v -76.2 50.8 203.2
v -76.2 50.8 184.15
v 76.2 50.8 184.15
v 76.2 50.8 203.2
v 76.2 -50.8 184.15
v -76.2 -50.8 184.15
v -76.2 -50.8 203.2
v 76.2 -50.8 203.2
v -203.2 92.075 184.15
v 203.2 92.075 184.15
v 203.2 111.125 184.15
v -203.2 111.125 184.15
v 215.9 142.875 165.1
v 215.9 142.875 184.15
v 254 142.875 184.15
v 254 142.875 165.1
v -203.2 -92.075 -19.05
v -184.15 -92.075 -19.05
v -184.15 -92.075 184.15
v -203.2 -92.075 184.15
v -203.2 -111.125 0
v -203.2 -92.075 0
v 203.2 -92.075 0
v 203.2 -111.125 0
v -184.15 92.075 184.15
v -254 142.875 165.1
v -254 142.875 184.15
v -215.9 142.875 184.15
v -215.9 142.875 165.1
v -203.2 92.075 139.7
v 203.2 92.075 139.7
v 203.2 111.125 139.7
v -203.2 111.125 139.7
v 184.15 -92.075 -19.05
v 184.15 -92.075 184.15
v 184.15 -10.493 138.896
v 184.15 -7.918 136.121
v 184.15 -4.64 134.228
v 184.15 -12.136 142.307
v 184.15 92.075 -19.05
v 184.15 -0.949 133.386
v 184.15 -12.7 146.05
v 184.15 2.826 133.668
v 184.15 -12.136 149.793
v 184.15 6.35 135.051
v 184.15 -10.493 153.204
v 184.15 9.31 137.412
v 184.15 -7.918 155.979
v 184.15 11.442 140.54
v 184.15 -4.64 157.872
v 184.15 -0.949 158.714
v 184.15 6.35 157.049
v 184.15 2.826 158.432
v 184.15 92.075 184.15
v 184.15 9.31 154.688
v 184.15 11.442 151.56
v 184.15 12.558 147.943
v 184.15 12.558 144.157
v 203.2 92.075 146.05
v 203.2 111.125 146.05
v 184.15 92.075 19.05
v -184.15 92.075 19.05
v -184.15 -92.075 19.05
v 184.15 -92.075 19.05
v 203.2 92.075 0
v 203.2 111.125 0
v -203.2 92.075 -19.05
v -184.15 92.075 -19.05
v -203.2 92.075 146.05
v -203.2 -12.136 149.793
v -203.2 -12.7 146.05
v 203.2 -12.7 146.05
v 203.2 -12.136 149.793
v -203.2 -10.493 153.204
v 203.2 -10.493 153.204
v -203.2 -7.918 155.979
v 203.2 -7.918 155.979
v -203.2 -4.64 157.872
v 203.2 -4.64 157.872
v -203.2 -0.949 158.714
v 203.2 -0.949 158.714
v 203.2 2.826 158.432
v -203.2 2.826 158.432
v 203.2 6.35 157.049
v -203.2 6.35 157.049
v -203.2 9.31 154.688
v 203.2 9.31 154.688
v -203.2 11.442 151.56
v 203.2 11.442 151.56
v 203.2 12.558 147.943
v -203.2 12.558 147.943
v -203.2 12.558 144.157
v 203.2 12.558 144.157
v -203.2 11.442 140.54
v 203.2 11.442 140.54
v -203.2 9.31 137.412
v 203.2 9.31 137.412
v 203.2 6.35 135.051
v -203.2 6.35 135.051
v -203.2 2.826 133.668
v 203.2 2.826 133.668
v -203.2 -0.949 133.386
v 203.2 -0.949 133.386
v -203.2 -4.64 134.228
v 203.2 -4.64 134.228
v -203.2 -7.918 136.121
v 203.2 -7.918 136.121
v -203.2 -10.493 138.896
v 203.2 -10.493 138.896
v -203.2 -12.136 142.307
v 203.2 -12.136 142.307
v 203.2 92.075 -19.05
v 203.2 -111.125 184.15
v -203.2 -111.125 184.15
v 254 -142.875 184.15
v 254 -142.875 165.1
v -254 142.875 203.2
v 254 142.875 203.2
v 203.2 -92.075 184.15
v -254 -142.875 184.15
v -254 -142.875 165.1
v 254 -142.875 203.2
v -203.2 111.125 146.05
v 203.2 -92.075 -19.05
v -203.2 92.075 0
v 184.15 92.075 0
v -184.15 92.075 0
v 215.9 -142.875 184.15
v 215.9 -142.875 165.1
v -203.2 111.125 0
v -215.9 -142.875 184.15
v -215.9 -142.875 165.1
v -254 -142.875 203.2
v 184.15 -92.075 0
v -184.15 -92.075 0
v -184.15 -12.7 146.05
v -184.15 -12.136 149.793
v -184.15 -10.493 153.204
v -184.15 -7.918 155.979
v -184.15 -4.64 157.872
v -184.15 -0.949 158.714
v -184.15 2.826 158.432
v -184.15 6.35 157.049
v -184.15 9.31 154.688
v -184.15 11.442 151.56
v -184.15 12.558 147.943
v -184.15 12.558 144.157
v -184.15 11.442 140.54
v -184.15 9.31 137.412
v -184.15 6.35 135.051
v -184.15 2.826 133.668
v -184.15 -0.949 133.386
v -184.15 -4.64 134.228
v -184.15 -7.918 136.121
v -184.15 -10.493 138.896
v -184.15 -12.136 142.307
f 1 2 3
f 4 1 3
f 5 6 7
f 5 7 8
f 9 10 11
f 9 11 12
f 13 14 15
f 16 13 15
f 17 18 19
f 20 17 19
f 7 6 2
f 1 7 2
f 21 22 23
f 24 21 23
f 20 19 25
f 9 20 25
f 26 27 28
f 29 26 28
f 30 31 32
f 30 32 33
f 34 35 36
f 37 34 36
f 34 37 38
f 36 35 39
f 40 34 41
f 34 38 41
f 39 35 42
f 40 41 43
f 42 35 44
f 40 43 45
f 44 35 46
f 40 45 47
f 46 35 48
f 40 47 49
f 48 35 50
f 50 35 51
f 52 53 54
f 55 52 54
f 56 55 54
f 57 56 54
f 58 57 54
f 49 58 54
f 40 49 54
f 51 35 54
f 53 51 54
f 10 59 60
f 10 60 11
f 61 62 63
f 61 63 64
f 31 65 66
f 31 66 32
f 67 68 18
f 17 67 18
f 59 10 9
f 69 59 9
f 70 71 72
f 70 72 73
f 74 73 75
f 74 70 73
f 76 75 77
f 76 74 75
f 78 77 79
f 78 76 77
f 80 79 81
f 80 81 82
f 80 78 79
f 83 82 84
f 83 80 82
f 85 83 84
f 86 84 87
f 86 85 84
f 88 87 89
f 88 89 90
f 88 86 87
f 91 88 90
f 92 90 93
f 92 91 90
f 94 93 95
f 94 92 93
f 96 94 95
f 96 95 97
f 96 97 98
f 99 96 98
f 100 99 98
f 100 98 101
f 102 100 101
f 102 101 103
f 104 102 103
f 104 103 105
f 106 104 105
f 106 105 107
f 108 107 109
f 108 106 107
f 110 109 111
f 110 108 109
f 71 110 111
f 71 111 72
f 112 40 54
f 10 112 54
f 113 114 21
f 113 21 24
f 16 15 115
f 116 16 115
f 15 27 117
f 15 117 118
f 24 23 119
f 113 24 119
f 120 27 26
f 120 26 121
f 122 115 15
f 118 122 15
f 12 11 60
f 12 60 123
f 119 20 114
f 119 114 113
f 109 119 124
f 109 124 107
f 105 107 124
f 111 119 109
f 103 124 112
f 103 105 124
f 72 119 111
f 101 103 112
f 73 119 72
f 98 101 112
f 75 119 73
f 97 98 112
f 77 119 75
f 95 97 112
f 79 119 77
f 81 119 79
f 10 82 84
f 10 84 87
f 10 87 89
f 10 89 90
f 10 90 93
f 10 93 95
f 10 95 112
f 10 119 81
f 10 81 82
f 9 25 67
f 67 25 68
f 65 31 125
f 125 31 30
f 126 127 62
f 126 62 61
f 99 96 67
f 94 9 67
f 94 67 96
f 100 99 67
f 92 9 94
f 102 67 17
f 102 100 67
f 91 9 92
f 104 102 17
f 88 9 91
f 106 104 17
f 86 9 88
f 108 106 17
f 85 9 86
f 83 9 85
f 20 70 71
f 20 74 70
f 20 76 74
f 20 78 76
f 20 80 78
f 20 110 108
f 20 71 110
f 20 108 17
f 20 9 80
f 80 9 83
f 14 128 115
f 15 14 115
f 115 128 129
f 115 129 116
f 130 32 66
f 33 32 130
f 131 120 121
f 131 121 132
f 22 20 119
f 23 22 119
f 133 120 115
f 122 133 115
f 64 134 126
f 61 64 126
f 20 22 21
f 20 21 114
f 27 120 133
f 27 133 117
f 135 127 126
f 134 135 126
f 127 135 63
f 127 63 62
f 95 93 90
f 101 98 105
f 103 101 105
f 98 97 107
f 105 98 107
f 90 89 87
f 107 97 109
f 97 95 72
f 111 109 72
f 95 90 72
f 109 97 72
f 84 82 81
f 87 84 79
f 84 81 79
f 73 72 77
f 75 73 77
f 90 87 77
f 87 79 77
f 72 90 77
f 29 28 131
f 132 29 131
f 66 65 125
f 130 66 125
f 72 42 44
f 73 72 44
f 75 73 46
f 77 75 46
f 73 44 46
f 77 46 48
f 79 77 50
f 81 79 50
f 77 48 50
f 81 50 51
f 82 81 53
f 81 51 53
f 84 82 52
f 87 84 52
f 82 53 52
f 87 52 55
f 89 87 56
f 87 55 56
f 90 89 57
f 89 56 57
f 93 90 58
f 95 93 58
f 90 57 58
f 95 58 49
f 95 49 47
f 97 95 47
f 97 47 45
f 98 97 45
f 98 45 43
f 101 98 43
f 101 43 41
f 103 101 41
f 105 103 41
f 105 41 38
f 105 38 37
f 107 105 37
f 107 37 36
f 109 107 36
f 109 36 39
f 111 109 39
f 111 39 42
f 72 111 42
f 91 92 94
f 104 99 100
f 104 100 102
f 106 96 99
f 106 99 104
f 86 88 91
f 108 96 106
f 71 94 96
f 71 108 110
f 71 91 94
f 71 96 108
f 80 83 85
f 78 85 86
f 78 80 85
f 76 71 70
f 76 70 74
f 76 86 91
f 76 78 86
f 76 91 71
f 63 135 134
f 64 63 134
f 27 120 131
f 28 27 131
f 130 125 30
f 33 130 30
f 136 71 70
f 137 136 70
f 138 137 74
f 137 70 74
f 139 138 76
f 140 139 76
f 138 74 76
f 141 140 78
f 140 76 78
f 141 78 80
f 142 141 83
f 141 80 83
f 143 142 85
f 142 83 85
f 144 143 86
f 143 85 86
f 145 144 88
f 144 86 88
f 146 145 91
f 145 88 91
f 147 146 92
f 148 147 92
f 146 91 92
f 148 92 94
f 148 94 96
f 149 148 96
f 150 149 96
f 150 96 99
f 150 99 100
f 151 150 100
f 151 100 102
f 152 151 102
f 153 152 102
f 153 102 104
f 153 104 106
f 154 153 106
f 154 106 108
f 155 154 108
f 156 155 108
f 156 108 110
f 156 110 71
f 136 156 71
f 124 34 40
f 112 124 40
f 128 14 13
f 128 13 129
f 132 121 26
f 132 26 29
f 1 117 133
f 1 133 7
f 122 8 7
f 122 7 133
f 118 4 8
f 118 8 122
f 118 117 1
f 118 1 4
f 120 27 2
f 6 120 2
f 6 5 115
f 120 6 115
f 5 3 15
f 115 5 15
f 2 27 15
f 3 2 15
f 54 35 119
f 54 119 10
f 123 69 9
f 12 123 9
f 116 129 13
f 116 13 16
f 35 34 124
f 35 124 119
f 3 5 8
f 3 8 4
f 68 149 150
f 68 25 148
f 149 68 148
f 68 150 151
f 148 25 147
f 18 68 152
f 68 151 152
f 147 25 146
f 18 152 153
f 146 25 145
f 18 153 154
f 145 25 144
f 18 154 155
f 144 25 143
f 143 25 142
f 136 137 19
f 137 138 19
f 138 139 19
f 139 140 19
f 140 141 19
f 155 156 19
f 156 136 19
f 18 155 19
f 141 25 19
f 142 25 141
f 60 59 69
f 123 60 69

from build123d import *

# Parameters (mm, degrees)
F0_W      = 368.3
F0_H      = 184.15
F1_DEPTH  = 19.05
F2_W      = 184.15
F2_H      = 203.2
F3_DEPTH  = 19.05
F5_DEPTH  = 19.05
F6_R      = 12.7
F7_DEPTH  = 406.401
F8_R      = 12.7
F9_DEPTH  = 406.4
F10_W     = 406.4
F10_H     = 139.7
F11_DEPTH = 19.05
F12_W     = 406.4
F12_H     = 184.15
F13_DEPTH = 19.05
F14_W     = 508
F14_H     = 285.75
F14_W_2   = 152.4
F14_H_2   = 101.6
F15_DEPTH = 19.05
F16_W     = 38.1
F16_H     = 285.75
F17_DEPTH = 19.05
F18_W     = 406.4
F18_H     = 38.1
F19_DEPTH = 19.05


with BuildPart() as f1:
    # F0 (on Top) → F1 (new body)
    with BuildSketch(Plane.XY):
        Rectangle(F0_W, F0_H)
    extrude(amount=F1_DEPTH)


with BuildPart() as f3:
    # F2 (on face) → F3 (new body)
    with BuildSketch(Plane.YZ.offset(184.15)):
        with Locations((0, 82.55)):
            Rectangle(F2_W, F2_H)
    extrude(amount=F3_DEPTH)


with BuildPart() as f5:
    # F4 (on face) → F5 (new body)
    with BuildSketch(Plane(origin=(-184.15, 0, 0), x_dir=(0, -1, 0), z_dir=(-1, 0, 0))):
        Polygon((92.075, -19.05), (92.075, 184.15), (-92.075, 184.15), (-92.075, -19.05), (0, -19.05), align=None)
    extrude(amount=F5_DEPTH)


with BuildPart() as f7_tool:
    # F6 (on face) → F7 (new body, through all)
    with BuildSketch(Plane(origin=(-203.2, 0, 0), x_dir=(0, -1, 0), z_dir=(-1, 0, 0))):
        with Locations((0, 146.05)):
            Circle(F6_R)
    extrude(amount=-F7_DEPTH)


with BuildPart() as f3_1:
    add(f3.part)

    # F7: cut by f7_tool
    add(f7_tool.part, mode=Mode.SUBTRACT)


with BuildPart() as f5_1:
    add(f5.part)

    # F7: cut by f7_tool
    add(f7_tool.part, mode=Mode.SUBTRACT)


with BuildPart() as f9:
    # F8 (on face) → F9 (new body, through all)
    with BuildSketch(Plane(origin=(-203.2, 0, 0), x_dir=(0, -1, 0), z_dir=(-1, 0, 0))):
        with Locations((0, 146.05)):
            Circle(F8_R)
    extrude(amount=-F9_DEPTH)


with BuildPart() as f11:
    # F10 (on face) → F11 (new body)
    with BuildSketch(Plane(origin=(0, 92.075, 0), x_dir=(-1, 0, 0), z_dir=(0, 1, 0))):
        with Locations((0, 69.85)):
            Rectangle(F10_W, F10_H)
    extrude(amount=F11_DEPTH)


with BuildPart() as f13:
    # F12 (on face) → F13 (new body)
    with BuildSketch(Plane.XZ.offset(92.075)):
        with Locations((0, 92.075)):
            Rectangle(F12_W, F12_H)
    extrude(amount=F13_DEPTH)


with BuildPart() as f15:
    # F14 (on face) → F15 (new body)
    with BuildSketch(Plane.XY.offset(184.15)):
        Rectangle(F14_W, F14_H)
        Rectangle(F14_W_2, F14_H_2, mode=Mode.SUBTRACT)
    extrude(amount=F15_DEPTH)


with BuildPart() as f17:
    # F16 (on face) → F17 (new body)
    with BuildSketch(Plane(origin=(0, 0, 184.15), x_dir=(1, 0, 0), z_dir=(0, 0, -1))):
        with Locations((-234.95, 0)):
            Rectangle(F16_W, F16_H)
        with Locations((234.95, 0)):
            Rectangle(F16_W, F16_H)
    extrude(amount=F17_DEPTH)


with BuildPart() as f19:
    # F18 (on face) → F19 (new body)
    with BuildSketch(Plane(origin=(0, 92.075, 0), x_dir=(-1, 0, 0), z_dir=(0, 1, 0))):
        with Locations((0, 165.1)):
            Rectangle(F18_W, F18_H)
    extrude(amount=F19_DEPTH)


solid = Compound([f1.part, f3_1.part, f5_1.part, f9.part, f11.part, f13.part, f15.part, f17.part, f19.part])
